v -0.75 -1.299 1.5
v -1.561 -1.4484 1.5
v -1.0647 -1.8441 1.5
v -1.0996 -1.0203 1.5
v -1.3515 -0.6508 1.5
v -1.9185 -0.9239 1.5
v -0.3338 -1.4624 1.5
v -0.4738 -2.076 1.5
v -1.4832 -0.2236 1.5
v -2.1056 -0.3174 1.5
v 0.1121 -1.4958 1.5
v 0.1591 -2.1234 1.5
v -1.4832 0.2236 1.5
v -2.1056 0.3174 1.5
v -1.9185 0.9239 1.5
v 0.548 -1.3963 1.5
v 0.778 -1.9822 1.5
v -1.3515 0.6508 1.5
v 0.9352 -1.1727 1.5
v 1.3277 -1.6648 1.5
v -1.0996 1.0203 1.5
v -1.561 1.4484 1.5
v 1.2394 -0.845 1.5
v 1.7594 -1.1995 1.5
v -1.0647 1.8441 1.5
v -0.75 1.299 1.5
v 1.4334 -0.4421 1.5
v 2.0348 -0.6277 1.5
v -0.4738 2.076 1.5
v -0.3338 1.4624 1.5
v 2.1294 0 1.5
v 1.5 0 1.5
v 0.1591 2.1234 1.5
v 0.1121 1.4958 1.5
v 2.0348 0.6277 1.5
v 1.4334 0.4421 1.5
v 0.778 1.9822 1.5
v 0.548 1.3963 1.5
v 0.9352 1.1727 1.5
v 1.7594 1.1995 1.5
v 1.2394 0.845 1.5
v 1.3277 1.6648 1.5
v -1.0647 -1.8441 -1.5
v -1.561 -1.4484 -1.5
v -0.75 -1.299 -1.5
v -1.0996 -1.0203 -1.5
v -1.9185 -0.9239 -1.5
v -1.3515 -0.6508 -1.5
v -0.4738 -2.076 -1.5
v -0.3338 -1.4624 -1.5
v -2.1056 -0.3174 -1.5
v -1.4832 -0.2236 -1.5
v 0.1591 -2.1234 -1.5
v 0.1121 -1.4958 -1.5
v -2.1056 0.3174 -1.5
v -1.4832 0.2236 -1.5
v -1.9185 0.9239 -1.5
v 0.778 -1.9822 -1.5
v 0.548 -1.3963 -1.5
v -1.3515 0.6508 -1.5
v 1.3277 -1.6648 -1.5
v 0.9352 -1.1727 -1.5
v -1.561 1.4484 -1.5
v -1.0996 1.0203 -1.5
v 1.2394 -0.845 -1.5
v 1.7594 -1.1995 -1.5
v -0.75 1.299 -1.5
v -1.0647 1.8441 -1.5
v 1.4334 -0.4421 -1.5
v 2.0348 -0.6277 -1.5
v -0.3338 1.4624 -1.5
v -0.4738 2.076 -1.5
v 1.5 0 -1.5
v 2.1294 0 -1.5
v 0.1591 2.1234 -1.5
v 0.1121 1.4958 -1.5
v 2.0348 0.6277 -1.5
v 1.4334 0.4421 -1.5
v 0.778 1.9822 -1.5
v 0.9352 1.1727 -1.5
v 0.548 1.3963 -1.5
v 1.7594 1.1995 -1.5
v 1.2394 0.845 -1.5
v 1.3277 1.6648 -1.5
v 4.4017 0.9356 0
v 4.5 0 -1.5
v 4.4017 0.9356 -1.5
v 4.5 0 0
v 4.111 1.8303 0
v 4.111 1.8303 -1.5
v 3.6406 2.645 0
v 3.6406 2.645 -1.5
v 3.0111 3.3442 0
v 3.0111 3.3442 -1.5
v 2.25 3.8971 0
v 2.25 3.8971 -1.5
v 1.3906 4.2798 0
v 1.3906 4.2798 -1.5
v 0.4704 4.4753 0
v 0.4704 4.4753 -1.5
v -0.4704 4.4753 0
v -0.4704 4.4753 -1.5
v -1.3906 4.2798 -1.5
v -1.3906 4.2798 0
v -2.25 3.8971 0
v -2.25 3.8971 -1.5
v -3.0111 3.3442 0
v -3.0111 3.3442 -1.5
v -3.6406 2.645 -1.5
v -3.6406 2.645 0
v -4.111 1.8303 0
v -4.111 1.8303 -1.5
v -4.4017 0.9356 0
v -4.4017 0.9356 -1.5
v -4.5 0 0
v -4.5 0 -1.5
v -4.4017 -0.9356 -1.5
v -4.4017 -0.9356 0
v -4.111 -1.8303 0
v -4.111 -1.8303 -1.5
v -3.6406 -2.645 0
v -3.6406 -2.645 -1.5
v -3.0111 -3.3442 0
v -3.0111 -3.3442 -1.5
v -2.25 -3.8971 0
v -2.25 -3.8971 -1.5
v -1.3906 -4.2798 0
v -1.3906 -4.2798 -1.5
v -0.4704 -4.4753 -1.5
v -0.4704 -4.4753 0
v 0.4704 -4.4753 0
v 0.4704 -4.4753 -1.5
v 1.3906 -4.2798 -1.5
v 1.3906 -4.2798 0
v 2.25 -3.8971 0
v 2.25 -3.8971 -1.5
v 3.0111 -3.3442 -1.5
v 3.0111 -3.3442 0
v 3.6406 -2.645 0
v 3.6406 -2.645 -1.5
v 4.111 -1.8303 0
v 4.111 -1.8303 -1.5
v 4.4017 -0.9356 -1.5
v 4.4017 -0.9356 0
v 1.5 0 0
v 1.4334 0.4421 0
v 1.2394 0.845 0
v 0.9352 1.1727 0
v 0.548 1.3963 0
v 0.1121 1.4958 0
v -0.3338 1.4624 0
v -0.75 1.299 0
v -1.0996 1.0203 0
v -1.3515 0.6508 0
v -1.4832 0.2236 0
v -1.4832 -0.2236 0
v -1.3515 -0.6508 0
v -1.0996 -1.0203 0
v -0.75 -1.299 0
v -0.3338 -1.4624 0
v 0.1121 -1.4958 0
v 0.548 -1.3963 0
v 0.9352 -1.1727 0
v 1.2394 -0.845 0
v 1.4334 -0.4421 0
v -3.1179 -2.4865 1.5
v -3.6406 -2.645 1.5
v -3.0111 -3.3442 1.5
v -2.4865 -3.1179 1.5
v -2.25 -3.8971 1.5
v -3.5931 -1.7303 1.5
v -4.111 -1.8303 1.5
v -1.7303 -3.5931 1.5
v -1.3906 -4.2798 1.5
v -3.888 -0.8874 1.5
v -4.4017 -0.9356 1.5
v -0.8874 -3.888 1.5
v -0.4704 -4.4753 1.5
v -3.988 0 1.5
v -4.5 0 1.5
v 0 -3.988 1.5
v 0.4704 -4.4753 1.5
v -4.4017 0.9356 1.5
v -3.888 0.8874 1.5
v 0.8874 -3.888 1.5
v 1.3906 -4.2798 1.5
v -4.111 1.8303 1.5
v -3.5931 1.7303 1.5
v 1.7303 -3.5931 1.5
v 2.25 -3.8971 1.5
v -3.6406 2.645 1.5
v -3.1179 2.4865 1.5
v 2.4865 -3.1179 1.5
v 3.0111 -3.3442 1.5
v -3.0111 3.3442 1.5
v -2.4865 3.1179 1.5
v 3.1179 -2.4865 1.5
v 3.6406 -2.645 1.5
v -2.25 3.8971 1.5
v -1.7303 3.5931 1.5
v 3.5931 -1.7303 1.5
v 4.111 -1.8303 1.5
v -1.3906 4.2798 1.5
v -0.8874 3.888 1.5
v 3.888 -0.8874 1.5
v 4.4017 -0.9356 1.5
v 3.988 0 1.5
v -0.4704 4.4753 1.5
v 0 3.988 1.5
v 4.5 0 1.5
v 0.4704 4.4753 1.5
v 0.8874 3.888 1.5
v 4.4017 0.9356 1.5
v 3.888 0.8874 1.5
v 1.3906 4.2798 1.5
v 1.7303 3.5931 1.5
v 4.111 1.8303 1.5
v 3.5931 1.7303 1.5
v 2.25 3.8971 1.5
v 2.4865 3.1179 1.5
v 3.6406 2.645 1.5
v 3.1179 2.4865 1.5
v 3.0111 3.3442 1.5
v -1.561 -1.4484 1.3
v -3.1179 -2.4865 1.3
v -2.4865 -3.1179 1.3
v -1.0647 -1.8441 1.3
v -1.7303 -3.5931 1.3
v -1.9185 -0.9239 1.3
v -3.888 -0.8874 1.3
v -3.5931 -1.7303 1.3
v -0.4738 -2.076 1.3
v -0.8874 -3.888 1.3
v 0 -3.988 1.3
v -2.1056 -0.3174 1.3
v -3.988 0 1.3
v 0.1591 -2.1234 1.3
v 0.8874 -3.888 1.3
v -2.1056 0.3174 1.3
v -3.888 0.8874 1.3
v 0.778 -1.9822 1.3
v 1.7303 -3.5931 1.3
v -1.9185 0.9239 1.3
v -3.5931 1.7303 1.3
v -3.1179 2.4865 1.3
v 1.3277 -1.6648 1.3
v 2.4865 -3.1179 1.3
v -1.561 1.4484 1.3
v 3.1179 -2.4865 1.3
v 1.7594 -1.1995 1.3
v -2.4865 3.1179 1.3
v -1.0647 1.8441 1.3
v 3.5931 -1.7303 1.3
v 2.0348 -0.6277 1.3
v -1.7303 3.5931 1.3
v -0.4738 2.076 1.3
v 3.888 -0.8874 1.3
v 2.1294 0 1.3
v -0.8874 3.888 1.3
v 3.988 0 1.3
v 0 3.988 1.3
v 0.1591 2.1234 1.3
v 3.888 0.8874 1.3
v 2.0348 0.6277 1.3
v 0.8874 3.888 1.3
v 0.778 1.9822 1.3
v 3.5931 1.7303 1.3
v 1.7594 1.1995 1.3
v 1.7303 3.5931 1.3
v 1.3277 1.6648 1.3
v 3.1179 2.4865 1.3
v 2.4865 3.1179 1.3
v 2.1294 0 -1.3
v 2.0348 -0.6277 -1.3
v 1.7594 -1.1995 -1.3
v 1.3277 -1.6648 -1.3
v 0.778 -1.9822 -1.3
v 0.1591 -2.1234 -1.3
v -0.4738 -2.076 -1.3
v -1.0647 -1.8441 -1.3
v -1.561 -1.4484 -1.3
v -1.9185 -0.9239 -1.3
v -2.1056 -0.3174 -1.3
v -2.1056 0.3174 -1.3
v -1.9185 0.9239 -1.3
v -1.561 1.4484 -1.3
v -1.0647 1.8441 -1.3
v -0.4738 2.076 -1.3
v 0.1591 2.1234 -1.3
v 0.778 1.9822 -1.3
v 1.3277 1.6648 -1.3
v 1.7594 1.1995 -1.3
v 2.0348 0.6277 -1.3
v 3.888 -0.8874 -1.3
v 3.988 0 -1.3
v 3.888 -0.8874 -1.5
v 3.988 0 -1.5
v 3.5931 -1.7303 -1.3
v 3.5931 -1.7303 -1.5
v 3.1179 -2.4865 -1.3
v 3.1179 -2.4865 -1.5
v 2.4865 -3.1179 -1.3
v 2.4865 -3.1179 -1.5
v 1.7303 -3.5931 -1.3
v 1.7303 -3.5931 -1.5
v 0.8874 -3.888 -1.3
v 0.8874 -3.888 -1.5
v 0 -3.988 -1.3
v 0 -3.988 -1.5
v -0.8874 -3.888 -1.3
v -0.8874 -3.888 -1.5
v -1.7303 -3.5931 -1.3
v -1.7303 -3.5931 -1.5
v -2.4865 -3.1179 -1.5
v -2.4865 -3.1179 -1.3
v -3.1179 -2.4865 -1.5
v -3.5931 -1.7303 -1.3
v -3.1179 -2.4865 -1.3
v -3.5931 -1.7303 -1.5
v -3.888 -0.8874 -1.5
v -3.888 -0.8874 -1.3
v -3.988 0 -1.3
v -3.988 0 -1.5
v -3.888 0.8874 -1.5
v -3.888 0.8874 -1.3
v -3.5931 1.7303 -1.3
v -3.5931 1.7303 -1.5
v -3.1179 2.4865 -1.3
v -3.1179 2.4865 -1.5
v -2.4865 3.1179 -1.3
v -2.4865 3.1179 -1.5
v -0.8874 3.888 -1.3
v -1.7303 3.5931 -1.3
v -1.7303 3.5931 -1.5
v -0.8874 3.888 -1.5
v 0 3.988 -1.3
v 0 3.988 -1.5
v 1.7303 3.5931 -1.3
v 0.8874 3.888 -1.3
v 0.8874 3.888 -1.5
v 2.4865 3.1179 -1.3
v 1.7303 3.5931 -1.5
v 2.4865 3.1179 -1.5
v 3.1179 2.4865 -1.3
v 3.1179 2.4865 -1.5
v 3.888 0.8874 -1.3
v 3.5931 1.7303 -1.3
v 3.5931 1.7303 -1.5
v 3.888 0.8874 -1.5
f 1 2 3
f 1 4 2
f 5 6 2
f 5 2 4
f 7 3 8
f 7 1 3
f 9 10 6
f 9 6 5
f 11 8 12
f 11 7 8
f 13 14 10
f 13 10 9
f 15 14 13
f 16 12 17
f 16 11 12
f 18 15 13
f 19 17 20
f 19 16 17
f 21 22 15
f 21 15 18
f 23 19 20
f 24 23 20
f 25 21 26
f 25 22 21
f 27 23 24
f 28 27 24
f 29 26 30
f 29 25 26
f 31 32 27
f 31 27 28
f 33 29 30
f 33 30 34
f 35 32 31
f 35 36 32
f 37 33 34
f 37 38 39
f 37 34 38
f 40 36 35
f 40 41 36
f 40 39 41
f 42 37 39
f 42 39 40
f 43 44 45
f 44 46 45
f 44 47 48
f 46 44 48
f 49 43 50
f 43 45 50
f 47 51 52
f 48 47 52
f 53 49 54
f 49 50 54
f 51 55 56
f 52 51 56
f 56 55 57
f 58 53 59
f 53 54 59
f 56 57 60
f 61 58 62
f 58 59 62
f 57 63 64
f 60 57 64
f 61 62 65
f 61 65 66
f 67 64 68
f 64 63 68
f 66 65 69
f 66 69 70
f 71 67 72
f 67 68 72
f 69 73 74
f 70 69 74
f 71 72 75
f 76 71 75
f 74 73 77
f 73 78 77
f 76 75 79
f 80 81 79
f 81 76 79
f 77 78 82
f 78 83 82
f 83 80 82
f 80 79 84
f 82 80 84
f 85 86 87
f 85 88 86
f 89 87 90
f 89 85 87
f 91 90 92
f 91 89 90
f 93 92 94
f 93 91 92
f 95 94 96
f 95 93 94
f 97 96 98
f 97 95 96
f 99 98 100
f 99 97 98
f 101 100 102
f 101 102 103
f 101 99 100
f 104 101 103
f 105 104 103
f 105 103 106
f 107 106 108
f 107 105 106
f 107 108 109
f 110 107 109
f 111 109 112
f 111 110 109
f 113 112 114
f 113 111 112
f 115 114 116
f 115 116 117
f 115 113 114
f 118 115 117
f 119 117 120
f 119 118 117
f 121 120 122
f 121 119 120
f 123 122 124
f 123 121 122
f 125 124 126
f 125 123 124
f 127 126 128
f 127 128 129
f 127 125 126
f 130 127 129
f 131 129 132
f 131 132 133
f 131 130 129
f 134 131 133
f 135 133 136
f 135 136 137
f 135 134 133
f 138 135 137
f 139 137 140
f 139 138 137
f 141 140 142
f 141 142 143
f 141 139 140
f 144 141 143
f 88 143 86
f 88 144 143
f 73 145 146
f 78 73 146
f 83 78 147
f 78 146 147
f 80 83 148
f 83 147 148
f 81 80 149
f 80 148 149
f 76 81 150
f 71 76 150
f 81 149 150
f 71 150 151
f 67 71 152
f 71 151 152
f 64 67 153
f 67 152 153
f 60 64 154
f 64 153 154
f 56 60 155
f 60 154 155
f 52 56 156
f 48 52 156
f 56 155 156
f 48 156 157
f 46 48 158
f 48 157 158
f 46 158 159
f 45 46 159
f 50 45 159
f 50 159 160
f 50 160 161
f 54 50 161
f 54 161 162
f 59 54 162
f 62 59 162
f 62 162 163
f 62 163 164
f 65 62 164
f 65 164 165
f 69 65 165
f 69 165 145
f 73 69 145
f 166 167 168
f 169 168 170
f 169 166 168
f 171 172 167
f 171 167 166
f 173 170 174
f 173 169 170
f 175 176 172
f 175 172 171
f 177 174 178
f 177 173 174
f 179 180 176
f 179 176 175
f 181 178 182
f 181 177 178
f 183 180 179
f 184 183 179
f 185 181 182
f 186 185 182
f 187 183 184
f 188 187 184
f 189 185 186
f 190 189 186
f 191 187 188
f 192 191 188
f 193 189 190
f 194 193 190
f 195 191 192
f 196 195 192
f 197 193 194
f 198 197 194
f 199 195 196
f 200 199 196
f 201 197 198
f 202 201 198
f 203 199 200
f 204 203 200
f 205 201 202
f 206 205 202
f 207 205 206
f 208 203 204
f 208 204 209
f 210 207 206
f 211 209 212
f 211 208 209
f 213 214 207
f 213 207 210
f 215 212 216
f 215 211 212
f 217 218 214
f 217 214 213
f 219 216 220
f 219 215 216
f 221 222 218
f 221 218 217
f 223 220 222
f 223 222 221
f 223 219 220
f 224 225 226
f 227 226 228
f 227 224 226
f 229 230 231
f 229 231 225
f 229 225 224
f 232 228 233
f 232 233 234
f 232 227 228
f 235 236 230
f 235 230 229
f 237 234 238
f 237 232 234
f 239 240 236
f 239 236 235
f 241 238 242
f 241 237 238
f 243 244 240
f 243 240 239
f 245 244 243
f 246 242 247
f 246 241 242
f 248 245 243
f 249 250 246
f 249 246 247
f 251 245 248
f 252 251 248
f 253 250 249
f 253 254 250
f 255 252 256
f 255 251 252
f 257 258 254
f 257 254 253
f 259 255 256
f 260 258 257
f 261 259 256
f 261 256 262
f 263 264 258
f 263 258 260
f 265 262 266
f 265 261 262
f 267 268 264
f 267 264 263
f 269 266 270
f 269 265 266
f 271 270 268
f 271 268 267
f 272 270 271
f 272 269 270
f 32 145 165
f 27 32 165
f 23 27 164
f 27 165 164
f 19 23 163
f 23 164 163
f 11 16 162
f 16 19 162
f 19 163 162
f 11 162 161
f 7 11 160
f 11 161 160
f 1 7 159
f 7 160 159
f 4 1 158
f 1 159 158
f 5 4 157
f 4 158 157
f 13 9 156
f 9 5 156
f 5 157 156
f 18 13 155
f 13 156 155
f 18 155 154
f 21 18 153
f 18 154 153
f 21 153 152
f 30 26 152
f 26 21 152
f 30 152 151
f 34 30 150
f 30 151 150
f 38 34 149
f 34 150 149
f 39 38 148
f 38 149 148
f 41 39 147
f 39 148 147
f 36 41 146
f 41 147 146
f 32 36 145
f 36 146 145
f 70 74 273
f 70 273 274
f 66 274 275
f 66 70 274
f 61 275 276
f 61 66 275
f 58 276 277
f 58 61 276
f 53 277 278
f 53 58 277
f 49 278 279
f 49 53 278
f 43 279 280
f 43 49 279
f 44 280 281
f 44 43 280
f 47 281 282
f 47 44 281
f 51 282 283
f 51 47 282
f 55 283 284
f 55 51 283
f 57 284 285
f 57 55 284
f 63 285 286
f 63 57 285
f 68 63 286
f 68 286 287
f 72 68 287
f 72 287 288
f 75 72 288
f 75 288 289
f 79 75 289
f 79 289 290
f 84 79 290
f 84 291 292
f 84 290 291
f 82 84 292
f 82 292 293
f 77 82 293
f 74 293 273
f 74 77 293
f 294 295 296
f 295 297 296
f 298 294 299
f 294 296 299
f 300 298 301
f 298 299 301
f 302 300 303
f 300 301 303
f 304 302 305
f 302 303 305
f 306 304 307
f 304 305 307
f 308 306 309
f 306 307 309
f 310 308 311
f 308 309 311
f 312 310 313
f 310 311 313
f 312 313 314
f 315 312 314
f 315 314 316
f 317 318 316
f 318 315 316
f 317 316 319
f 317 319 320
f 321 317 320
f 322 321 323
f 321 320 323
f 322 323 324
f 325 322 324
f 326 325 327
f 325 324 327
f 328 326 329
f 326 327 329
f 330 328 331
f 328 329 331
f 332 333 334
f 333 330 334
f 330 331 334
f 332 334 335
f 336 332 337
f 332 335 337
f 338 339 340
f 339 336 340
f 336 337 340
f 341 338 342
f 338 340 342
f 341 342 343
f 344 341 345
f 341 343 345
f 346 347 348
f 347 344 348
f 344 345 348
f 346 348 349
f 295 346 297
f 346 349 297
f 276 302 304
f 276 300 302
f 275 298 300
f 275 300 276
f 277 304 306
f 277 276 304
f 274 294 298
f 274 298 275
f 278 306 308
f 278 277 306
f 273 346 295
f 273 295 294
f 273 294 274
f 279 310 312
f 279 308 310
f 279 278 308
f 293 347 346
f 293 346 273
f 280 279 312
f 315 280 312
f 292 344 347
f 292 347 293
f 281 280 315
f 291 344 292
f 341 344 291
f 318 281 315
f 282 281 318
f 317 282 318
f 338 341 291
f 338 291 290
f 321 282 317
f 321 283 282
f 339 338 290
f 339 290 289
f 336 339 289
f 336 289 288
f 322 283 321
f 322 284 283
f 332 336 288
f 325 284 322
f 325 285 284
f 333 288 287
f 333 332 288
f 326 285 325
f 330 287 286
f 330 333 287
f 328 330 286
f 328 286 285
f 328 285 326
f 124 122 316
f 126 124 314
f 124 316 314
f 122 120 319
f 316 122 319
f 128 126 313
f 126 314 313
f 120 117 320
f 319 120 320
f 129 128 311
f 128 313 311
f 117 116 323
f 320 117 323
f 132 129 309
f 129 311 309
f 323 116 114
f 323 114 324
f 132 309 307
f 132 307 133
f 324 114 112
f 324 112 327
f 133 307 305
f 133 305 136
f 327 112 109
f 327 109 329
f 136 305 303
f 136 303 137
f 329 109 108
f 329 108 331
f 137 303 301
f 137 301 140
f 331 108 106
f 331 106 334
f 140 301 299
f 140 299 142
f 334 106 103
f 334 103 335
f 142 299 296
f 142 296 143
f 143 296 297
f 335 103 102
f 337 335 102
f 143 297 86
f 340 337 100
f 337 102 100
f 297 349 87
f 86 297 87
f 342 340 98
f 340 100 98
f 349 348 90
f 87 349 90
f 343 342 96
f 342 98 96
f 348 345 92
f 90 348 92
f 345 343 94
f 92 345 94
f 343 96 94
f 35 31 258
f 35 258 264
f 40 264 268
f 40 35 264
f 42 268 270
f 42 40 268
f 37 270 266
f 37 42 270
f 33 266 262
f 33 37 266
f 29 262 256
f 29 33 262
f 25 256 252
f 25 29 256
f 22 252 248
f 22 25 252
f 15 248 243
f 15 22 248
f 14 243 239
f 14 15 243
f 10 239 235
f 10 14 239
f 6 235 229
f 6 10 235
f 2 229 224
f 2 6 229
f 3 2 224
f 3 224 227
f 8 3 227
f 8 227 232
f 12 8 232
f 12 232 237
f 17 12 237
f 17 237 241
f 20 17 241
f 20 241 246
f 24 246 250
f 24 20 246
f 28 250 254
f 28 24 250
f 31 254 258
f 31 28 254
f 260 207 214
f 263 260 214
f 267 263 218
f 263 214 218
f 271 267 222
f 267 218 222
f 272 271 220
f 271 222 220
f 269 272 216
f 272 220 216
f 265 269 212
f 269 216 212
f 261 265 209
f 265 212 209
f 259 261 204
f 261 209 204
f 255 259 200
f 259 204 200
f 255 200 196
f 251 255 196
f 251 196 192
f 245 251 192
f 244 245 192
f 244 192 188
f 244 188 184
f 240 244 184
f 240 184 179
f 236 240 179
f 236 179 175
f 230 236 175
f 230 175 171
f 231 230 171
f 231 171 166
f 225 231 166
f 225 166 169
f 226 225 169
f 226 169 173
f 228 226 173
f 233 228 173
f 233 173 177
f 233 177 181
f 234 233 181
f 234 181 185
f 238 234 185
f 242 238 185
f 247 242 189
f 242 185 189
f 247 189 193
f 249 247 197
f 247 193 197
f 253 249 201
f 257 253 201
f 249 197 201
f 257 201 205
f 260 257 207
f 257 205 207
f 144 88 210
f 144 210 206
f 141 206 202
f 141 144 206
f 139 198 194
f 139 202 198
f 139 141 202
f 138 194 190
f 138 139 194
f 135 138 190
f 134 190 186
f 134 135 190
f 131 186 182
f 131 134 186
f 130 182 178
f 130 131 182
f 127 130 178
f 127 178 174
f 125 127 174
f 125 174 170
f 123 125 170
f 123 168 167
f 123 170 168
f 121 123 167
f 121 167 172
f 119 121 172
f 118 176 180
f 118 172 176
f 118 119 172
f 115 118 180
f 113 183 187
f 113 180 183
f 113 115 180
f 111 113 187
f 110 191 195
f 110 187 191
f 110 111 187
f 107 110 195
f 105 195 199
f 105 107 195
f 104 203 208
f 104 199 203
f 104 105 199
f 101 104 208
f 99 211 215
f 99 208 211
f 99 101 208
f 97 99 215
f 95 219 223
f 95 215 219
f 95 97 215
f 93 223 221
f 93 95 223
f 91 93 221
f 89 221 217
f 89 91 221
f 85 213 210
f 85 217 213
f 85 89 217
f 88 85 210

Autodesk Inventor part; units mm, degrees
ref_plane "YZ Plane" through (0, 0, 0) normal (1, 0, 0) x (0, 1, 0)
ref_plane "XZ Plane" through (0, 0, 0) normal (0, 1, 0) x (-1, 0, 0)
ref_plane "XY Plane" through (0, 0, 0) normal (0, 0, 1) x (1, 0, 0)
sketch "Sketch1" plane through (0, 0, 0) normal (0, 0, 1) x (1, 0, 0)
  circle A0 centre (0, 0) radius 4.5
  circle A1 centre (0, 0) radius 1.5
  dimension "d0" = 9
  dimension "d1" = 3
extrude "Extrusion1" add sketch "Sketch1" along normal mid plane 3
sketch "Sketch2" plane through (0, 0, 1.5) normal (0, 0, 1) x (1, 0, 0)
  circle A0 centre (0, 0) radius 2.1294
  circle A1 centre (0, 0) radius 3.988
extrude "Extrusion2" cut sketch "Sketch2" against normal blind 0.2
mirror "Mirror1" about plane through (0, 0, 0) normal (0, 0, 1) of "Extrusion2"
properties part number "603 Bearing"
